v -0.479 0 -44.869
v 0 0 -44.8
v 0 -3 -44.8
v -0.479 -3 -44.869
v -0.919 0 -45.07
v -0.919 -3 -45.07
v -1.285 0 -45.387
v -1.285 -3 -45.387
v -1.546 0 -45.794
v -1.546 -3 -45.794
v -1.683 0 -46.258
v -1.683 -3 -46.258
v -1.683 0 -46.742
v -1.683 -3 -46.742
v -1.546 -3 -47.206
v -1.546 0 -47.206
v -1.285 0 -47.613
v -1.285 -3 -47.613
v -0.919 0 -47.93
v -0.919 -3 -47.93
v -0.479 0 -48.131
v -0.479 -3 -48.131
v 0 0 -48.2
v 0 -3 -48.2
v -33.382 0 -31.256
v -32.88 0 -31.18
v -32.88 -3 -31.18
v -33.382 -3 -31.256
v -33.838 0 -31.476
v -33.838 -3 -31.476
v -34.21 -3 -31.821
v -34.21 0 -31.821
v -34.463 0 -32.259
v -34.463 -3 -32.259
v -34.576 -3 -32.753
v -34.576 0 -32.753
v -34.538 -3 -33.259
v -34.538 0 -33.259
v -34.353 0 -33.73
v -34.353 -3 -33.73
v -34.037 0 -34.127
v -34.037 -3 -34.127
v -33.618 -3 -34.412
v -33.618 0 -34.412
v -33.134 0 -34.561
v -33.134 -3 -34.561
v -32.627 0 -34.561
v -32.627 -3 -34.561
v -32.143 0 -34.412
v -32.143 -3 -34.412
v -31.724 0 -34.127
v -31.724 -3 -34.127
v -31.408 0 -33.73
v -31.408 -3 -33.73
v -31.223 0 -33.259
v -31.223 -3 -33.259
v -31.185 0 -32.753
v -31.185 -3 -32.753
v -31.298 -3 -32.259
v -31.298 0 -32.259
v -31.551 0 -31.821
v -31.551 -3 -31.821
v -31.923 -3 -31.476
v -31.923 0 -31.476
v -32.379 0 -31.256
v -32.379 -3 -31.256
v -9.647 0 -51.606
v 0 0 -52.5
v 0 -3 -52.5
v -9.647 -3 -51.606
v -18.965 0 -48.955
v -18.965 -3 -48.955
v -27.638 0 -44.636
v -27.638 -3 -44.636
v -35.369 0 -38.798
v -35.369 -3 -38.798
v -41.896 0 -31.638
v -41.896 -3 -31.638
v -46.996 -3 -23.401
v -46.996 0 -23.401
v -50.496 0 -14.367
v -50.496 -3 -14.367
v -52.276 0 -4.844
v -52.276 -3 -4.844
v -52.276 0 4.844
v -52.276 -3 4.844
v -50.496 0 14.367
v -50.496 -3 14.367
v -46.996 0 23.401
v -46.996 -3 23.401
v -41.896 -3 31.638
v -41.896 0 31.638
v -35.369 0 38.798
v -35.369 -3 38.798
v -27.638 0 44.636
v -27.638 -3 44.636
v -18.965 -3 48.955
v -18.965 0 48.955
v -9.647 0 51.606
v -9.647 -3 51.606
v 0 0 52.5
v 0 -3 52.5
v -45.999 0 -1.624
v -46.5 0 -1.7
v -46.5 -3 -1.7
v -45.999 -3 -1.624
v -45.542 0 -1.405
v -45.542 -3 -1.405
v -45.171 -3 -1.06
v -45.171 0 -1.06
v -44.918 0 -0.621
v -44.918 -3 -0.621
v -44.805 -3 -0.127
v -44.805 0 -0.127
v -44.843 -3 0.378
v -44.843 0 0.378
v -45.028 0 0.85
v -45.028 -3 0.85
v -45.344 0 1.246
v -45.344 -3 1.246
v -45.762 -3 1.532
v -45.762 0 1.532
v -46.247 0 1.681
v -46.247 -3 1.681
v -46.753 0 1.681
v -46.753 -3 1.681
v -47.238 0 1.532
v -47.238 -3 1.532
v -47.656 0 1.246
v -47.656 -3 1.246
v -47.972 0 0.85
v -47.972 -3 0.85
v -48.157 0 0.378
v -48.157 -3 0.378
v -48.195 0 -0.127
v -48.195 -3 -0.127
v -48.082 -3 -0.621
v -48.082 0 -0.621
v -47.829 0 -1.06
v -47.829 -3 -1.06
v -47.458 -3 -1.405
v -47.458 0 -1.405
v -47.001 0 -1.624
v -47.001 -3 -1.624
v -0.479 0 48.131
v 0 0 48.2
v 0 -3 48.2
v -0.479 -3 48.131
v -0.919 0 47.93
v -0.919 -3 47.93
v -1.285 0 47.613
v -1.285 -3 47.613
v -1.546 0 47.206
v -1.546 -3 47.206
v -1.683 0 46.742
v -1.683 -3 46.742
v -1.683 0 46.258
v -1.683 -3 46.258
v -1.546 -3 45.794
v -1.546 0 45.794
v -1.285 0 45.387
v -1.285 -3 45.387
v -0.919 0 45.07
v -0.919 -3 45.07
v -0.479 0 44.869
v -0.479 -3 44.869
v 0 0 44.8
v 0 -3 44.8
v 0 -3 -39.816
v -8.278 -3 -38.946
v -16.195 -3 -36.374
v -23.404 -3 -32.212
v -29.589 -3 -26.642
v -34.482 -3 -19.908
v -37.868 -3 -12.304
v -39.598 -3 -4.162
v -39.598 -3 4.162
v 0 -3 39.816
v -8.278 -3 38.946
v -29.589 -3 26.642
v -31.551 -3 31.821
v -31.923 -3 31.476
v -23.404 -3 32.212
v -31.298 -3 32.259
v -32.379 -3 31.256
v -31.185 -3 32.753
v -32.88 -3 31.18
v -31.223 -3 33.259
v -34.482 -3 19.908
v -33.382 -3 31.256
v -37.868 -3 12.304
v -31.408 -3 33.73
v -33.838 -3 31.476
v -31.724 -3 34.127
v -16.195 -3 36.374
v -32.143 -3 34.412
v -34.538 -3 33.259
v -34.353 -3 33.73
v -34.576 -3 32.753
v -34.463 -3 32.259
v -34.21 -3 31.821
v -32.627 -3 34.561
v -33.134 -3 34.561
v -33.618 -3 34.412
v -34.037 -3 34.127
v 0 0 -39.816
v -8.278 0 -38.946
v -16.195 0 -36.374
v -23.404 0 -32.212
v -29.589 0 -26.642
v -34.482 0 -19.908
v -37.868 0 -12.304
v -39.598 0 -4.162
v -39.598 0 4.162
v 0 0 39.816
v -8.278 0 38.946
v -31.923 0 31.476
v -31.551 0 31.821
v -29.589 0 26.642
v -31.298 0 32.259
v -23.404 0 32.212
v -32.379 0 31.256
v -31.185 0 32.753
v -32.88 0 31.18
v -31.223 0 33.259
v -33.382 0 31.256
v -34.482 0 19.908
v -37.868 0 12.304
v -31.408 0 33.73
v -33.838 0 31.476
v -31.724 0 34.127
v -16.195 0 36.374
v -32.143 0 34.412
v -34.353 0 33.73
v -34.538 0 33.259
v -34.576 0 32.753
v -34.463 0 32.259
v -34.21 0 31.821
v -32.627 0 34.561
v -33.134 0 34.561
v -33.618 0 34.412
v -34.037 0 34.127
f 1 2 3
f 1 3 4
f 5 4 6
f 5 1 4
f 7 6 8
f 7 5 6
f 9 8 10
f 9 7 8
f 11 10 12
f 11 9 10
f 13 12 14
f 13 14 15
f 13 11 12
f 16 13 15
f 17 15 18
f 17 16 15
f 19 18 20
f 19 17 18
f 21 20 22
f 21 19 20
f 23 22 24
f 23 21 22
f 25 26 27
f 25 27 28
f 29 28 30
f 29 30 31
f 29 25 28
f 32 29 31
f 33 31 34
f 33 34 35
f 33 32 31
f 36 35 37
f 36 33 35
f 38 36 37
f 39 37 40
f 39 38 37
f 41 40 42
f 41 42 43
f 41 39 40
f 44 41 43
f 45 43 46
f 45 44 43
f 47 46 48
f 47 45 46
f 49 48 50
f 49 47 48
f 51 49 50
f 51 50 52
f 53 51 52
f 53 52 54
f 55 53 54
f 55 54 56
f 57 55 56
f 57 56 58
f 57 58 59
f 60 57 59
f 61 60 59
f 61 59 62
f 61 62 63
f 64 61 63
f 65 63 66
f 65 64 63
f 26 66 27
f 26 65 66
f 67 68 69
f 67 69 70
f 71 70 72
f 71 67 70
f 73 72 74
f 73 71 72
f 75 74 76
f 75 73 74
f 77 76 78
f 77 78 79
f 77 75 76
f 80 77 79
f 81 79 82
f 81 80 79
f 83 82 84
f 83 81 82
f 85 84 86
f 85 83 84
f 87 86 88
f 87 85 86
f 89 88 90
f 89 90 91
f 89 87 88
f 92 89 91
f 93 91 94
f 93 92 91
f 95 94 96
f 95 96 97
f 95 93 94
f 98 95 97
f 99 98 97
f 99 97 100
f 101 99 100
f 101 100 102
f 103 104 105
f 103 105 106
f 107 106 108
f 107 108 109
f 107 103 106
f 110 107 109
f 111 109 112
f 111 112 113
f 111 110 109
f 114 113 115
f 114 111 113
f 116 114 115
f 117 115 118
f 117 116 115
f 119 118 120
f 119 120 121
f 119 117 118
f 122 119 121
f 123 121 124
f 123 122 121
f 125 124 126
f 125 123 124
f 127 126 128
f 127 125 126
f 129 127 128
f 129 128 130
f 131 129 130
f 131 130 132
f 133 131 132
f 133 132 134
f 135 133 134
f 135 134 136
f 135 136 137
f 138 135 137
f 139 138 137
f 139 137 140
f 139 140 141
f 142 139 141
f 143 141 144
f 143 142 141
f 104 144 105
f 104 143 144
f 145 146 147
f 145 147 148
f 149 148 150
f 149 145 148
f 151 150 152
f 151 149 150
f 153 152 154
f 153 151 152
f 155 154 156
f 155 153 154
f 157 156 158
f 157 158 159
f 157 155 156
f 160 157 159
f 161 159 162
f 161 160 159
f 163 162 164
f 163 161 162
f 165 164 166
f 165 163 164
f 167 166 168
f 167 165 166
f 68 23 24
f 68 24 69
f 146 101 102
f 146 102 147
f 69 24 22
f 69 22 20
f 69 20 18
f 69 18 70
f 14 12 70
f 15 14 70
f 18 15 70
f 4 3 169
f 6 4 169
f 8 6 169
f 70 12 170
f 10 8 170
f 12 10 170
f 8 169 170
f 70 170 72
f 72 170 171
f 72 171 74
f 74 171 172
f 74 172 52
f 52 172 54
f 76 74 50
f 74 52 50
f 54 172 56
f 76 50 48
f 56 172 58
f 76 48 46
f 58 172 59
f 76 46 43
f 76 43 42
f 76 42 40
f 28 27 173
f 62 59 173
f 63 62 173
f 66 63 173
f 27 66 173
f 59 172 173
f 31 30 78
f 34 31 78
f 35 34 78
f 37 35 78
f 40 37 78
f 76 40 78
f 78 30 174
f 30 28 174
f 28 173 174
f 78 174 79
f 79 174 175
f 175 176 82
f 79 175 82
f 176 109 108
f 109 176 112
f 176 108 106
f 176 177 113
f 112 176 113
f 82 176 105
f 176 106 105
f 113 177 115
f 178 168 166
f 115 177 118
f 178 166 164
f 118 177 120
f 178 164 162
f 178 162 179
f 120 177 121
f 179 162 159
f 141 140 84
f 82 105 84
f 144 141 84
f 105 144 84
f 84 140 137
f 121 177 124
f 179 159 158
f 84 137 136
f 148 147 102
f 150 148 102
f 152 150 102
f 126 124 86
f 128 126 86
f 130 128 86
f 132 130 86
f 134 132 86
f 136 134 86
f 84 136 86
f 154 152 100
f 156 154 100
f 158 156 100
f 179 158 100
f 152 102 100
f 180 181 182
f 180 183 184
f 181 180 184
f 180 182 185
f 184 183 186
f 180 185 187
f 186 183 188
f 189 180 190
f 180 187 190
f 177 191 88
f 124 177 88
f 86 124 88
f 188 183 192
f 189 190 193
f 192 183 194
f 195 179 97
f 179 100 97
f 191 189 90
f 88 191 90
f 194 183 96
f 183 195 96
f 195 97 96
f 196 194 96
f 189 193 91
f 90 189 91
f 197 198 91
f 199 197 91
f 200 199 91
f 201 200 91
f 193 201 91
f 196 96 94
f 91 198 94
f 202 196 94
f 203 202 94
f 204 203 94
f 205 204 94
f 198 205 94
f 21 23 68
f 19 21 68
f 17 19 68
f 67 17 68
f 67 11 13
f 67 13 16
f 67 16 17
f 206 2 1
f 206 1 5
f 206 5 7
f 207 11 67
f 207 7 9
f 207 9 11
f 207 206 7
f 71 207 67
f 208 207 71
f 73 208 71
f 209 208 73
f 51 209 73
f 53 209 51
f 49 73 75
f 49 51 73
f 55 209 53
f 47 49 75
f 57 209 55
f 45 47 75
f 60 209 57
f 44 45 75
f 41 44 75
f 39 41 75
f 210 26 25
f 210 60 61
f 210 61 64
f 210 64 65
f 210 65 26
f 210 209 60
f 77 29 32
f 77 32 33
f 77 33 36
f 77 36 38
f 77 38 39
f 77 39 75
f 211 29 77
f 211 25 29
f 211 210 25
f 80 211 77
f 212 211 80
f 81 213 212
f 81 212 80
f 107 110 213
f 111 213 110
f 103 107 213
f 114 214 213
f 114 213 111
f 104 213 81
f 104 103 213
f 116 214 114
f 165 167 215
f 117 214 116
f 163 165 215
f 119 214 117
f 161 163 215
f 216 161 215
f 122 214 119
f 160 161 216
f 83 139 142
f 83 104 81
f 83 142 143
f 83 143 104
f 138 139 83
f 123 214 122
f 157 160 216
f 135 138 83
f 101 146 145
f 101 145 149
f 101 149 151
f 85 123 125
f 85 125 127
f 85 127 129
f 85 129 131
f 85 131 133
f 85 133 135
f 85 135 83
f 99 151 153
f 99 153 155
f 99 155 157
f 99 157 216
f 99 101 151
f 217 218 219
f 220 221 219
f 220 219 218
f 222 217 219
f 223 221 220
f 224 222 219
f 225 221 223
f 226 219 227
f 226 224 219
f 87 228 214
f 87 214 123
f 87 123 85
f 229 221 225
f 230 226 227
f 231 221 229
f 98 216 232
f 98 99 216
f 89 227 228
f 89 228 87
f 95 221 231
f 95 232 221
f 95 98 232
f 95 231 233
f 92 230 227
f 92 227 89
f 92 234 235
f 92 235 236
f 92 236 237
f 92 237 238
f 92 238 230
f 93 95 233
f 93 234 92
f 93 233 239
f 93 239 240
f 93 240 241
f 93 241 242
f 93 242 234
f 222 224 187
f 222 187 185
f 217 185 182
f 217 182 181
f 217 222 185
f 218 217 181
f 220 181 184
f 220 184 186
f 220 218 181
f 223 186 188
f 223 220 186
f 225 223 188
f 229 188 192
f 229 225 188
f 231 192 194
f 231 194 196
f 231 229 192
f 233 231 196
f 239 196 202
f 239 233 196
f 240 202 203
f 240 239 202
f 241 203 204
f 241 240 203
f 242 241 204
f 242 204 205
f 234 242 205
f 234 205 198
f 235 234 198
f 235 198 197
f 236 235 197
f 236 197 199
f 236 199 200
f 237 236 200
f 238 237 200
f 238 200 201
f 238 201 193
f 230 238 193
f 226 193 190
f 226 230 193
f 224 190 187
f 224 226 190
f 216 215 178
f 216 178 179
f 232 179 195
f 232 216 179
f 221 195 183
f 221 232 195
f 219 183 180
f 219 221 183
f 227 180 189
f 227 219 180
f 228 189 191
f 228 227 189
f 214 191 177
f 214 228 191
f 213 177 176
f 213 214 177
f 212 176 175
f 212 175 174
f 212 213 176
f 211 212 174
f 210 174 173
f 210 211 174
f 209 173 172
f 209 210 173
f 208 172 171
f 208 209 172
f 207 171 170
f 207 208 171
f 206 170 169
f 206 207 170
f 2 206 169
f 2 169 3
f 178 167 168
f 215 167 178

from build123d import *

# Parameters (mm, degrees)
SKETCH1_R           = 1.7
BOSS_EXTRUDE1_DEPTH = 3


with BuildPart() as part:
    # Sketch1 → Boss-Extrude1 (new body)
    with BuildSketch(Plane.XZ):
        with BuildLine():
            Line((0, 52.5), (0, 48.2))
            ThreePointArc((0, 48.2), (-1.7, 46.5), (0, 44.8))
            Line((0, 44.8), (0, 39.816447761))
            ThreePointArc((0, 39.816447761), (-39.816447761, 0), (0, -39.816447761))
            Line((0, -39.816447761), (0, -44.8))
            ThreePointArc((0, -44.8), (-1.7, -46.5), (0, -48.2))
            Line((0, -48.2), (0, -52.5))
            ThreePointArc((0, -52.5), (-52.5, 0), (0, 52.5))
        make_face()
        with Locations(Location((-46.5, 0, 0), (0, 0, 270))):
            Circle(SKETCH1_R, mode=Mode.SUBTRACT)
        with Locations(Location((-32.880465325, 32.880465325, 0), (0, 0, 270))):
            Circle(SKETCH1_R, mode=Mode.SUBTRACT)
        with Locations(Location((-32.880465325, -32.880465325, 0), (0, 0, 90))):
            Circle(SKETCH1_R, mode=Mode.SUBTRACT)
    extrude(amount=BOSS_EXTRUDE1_DEPTH)


solid = part.part
